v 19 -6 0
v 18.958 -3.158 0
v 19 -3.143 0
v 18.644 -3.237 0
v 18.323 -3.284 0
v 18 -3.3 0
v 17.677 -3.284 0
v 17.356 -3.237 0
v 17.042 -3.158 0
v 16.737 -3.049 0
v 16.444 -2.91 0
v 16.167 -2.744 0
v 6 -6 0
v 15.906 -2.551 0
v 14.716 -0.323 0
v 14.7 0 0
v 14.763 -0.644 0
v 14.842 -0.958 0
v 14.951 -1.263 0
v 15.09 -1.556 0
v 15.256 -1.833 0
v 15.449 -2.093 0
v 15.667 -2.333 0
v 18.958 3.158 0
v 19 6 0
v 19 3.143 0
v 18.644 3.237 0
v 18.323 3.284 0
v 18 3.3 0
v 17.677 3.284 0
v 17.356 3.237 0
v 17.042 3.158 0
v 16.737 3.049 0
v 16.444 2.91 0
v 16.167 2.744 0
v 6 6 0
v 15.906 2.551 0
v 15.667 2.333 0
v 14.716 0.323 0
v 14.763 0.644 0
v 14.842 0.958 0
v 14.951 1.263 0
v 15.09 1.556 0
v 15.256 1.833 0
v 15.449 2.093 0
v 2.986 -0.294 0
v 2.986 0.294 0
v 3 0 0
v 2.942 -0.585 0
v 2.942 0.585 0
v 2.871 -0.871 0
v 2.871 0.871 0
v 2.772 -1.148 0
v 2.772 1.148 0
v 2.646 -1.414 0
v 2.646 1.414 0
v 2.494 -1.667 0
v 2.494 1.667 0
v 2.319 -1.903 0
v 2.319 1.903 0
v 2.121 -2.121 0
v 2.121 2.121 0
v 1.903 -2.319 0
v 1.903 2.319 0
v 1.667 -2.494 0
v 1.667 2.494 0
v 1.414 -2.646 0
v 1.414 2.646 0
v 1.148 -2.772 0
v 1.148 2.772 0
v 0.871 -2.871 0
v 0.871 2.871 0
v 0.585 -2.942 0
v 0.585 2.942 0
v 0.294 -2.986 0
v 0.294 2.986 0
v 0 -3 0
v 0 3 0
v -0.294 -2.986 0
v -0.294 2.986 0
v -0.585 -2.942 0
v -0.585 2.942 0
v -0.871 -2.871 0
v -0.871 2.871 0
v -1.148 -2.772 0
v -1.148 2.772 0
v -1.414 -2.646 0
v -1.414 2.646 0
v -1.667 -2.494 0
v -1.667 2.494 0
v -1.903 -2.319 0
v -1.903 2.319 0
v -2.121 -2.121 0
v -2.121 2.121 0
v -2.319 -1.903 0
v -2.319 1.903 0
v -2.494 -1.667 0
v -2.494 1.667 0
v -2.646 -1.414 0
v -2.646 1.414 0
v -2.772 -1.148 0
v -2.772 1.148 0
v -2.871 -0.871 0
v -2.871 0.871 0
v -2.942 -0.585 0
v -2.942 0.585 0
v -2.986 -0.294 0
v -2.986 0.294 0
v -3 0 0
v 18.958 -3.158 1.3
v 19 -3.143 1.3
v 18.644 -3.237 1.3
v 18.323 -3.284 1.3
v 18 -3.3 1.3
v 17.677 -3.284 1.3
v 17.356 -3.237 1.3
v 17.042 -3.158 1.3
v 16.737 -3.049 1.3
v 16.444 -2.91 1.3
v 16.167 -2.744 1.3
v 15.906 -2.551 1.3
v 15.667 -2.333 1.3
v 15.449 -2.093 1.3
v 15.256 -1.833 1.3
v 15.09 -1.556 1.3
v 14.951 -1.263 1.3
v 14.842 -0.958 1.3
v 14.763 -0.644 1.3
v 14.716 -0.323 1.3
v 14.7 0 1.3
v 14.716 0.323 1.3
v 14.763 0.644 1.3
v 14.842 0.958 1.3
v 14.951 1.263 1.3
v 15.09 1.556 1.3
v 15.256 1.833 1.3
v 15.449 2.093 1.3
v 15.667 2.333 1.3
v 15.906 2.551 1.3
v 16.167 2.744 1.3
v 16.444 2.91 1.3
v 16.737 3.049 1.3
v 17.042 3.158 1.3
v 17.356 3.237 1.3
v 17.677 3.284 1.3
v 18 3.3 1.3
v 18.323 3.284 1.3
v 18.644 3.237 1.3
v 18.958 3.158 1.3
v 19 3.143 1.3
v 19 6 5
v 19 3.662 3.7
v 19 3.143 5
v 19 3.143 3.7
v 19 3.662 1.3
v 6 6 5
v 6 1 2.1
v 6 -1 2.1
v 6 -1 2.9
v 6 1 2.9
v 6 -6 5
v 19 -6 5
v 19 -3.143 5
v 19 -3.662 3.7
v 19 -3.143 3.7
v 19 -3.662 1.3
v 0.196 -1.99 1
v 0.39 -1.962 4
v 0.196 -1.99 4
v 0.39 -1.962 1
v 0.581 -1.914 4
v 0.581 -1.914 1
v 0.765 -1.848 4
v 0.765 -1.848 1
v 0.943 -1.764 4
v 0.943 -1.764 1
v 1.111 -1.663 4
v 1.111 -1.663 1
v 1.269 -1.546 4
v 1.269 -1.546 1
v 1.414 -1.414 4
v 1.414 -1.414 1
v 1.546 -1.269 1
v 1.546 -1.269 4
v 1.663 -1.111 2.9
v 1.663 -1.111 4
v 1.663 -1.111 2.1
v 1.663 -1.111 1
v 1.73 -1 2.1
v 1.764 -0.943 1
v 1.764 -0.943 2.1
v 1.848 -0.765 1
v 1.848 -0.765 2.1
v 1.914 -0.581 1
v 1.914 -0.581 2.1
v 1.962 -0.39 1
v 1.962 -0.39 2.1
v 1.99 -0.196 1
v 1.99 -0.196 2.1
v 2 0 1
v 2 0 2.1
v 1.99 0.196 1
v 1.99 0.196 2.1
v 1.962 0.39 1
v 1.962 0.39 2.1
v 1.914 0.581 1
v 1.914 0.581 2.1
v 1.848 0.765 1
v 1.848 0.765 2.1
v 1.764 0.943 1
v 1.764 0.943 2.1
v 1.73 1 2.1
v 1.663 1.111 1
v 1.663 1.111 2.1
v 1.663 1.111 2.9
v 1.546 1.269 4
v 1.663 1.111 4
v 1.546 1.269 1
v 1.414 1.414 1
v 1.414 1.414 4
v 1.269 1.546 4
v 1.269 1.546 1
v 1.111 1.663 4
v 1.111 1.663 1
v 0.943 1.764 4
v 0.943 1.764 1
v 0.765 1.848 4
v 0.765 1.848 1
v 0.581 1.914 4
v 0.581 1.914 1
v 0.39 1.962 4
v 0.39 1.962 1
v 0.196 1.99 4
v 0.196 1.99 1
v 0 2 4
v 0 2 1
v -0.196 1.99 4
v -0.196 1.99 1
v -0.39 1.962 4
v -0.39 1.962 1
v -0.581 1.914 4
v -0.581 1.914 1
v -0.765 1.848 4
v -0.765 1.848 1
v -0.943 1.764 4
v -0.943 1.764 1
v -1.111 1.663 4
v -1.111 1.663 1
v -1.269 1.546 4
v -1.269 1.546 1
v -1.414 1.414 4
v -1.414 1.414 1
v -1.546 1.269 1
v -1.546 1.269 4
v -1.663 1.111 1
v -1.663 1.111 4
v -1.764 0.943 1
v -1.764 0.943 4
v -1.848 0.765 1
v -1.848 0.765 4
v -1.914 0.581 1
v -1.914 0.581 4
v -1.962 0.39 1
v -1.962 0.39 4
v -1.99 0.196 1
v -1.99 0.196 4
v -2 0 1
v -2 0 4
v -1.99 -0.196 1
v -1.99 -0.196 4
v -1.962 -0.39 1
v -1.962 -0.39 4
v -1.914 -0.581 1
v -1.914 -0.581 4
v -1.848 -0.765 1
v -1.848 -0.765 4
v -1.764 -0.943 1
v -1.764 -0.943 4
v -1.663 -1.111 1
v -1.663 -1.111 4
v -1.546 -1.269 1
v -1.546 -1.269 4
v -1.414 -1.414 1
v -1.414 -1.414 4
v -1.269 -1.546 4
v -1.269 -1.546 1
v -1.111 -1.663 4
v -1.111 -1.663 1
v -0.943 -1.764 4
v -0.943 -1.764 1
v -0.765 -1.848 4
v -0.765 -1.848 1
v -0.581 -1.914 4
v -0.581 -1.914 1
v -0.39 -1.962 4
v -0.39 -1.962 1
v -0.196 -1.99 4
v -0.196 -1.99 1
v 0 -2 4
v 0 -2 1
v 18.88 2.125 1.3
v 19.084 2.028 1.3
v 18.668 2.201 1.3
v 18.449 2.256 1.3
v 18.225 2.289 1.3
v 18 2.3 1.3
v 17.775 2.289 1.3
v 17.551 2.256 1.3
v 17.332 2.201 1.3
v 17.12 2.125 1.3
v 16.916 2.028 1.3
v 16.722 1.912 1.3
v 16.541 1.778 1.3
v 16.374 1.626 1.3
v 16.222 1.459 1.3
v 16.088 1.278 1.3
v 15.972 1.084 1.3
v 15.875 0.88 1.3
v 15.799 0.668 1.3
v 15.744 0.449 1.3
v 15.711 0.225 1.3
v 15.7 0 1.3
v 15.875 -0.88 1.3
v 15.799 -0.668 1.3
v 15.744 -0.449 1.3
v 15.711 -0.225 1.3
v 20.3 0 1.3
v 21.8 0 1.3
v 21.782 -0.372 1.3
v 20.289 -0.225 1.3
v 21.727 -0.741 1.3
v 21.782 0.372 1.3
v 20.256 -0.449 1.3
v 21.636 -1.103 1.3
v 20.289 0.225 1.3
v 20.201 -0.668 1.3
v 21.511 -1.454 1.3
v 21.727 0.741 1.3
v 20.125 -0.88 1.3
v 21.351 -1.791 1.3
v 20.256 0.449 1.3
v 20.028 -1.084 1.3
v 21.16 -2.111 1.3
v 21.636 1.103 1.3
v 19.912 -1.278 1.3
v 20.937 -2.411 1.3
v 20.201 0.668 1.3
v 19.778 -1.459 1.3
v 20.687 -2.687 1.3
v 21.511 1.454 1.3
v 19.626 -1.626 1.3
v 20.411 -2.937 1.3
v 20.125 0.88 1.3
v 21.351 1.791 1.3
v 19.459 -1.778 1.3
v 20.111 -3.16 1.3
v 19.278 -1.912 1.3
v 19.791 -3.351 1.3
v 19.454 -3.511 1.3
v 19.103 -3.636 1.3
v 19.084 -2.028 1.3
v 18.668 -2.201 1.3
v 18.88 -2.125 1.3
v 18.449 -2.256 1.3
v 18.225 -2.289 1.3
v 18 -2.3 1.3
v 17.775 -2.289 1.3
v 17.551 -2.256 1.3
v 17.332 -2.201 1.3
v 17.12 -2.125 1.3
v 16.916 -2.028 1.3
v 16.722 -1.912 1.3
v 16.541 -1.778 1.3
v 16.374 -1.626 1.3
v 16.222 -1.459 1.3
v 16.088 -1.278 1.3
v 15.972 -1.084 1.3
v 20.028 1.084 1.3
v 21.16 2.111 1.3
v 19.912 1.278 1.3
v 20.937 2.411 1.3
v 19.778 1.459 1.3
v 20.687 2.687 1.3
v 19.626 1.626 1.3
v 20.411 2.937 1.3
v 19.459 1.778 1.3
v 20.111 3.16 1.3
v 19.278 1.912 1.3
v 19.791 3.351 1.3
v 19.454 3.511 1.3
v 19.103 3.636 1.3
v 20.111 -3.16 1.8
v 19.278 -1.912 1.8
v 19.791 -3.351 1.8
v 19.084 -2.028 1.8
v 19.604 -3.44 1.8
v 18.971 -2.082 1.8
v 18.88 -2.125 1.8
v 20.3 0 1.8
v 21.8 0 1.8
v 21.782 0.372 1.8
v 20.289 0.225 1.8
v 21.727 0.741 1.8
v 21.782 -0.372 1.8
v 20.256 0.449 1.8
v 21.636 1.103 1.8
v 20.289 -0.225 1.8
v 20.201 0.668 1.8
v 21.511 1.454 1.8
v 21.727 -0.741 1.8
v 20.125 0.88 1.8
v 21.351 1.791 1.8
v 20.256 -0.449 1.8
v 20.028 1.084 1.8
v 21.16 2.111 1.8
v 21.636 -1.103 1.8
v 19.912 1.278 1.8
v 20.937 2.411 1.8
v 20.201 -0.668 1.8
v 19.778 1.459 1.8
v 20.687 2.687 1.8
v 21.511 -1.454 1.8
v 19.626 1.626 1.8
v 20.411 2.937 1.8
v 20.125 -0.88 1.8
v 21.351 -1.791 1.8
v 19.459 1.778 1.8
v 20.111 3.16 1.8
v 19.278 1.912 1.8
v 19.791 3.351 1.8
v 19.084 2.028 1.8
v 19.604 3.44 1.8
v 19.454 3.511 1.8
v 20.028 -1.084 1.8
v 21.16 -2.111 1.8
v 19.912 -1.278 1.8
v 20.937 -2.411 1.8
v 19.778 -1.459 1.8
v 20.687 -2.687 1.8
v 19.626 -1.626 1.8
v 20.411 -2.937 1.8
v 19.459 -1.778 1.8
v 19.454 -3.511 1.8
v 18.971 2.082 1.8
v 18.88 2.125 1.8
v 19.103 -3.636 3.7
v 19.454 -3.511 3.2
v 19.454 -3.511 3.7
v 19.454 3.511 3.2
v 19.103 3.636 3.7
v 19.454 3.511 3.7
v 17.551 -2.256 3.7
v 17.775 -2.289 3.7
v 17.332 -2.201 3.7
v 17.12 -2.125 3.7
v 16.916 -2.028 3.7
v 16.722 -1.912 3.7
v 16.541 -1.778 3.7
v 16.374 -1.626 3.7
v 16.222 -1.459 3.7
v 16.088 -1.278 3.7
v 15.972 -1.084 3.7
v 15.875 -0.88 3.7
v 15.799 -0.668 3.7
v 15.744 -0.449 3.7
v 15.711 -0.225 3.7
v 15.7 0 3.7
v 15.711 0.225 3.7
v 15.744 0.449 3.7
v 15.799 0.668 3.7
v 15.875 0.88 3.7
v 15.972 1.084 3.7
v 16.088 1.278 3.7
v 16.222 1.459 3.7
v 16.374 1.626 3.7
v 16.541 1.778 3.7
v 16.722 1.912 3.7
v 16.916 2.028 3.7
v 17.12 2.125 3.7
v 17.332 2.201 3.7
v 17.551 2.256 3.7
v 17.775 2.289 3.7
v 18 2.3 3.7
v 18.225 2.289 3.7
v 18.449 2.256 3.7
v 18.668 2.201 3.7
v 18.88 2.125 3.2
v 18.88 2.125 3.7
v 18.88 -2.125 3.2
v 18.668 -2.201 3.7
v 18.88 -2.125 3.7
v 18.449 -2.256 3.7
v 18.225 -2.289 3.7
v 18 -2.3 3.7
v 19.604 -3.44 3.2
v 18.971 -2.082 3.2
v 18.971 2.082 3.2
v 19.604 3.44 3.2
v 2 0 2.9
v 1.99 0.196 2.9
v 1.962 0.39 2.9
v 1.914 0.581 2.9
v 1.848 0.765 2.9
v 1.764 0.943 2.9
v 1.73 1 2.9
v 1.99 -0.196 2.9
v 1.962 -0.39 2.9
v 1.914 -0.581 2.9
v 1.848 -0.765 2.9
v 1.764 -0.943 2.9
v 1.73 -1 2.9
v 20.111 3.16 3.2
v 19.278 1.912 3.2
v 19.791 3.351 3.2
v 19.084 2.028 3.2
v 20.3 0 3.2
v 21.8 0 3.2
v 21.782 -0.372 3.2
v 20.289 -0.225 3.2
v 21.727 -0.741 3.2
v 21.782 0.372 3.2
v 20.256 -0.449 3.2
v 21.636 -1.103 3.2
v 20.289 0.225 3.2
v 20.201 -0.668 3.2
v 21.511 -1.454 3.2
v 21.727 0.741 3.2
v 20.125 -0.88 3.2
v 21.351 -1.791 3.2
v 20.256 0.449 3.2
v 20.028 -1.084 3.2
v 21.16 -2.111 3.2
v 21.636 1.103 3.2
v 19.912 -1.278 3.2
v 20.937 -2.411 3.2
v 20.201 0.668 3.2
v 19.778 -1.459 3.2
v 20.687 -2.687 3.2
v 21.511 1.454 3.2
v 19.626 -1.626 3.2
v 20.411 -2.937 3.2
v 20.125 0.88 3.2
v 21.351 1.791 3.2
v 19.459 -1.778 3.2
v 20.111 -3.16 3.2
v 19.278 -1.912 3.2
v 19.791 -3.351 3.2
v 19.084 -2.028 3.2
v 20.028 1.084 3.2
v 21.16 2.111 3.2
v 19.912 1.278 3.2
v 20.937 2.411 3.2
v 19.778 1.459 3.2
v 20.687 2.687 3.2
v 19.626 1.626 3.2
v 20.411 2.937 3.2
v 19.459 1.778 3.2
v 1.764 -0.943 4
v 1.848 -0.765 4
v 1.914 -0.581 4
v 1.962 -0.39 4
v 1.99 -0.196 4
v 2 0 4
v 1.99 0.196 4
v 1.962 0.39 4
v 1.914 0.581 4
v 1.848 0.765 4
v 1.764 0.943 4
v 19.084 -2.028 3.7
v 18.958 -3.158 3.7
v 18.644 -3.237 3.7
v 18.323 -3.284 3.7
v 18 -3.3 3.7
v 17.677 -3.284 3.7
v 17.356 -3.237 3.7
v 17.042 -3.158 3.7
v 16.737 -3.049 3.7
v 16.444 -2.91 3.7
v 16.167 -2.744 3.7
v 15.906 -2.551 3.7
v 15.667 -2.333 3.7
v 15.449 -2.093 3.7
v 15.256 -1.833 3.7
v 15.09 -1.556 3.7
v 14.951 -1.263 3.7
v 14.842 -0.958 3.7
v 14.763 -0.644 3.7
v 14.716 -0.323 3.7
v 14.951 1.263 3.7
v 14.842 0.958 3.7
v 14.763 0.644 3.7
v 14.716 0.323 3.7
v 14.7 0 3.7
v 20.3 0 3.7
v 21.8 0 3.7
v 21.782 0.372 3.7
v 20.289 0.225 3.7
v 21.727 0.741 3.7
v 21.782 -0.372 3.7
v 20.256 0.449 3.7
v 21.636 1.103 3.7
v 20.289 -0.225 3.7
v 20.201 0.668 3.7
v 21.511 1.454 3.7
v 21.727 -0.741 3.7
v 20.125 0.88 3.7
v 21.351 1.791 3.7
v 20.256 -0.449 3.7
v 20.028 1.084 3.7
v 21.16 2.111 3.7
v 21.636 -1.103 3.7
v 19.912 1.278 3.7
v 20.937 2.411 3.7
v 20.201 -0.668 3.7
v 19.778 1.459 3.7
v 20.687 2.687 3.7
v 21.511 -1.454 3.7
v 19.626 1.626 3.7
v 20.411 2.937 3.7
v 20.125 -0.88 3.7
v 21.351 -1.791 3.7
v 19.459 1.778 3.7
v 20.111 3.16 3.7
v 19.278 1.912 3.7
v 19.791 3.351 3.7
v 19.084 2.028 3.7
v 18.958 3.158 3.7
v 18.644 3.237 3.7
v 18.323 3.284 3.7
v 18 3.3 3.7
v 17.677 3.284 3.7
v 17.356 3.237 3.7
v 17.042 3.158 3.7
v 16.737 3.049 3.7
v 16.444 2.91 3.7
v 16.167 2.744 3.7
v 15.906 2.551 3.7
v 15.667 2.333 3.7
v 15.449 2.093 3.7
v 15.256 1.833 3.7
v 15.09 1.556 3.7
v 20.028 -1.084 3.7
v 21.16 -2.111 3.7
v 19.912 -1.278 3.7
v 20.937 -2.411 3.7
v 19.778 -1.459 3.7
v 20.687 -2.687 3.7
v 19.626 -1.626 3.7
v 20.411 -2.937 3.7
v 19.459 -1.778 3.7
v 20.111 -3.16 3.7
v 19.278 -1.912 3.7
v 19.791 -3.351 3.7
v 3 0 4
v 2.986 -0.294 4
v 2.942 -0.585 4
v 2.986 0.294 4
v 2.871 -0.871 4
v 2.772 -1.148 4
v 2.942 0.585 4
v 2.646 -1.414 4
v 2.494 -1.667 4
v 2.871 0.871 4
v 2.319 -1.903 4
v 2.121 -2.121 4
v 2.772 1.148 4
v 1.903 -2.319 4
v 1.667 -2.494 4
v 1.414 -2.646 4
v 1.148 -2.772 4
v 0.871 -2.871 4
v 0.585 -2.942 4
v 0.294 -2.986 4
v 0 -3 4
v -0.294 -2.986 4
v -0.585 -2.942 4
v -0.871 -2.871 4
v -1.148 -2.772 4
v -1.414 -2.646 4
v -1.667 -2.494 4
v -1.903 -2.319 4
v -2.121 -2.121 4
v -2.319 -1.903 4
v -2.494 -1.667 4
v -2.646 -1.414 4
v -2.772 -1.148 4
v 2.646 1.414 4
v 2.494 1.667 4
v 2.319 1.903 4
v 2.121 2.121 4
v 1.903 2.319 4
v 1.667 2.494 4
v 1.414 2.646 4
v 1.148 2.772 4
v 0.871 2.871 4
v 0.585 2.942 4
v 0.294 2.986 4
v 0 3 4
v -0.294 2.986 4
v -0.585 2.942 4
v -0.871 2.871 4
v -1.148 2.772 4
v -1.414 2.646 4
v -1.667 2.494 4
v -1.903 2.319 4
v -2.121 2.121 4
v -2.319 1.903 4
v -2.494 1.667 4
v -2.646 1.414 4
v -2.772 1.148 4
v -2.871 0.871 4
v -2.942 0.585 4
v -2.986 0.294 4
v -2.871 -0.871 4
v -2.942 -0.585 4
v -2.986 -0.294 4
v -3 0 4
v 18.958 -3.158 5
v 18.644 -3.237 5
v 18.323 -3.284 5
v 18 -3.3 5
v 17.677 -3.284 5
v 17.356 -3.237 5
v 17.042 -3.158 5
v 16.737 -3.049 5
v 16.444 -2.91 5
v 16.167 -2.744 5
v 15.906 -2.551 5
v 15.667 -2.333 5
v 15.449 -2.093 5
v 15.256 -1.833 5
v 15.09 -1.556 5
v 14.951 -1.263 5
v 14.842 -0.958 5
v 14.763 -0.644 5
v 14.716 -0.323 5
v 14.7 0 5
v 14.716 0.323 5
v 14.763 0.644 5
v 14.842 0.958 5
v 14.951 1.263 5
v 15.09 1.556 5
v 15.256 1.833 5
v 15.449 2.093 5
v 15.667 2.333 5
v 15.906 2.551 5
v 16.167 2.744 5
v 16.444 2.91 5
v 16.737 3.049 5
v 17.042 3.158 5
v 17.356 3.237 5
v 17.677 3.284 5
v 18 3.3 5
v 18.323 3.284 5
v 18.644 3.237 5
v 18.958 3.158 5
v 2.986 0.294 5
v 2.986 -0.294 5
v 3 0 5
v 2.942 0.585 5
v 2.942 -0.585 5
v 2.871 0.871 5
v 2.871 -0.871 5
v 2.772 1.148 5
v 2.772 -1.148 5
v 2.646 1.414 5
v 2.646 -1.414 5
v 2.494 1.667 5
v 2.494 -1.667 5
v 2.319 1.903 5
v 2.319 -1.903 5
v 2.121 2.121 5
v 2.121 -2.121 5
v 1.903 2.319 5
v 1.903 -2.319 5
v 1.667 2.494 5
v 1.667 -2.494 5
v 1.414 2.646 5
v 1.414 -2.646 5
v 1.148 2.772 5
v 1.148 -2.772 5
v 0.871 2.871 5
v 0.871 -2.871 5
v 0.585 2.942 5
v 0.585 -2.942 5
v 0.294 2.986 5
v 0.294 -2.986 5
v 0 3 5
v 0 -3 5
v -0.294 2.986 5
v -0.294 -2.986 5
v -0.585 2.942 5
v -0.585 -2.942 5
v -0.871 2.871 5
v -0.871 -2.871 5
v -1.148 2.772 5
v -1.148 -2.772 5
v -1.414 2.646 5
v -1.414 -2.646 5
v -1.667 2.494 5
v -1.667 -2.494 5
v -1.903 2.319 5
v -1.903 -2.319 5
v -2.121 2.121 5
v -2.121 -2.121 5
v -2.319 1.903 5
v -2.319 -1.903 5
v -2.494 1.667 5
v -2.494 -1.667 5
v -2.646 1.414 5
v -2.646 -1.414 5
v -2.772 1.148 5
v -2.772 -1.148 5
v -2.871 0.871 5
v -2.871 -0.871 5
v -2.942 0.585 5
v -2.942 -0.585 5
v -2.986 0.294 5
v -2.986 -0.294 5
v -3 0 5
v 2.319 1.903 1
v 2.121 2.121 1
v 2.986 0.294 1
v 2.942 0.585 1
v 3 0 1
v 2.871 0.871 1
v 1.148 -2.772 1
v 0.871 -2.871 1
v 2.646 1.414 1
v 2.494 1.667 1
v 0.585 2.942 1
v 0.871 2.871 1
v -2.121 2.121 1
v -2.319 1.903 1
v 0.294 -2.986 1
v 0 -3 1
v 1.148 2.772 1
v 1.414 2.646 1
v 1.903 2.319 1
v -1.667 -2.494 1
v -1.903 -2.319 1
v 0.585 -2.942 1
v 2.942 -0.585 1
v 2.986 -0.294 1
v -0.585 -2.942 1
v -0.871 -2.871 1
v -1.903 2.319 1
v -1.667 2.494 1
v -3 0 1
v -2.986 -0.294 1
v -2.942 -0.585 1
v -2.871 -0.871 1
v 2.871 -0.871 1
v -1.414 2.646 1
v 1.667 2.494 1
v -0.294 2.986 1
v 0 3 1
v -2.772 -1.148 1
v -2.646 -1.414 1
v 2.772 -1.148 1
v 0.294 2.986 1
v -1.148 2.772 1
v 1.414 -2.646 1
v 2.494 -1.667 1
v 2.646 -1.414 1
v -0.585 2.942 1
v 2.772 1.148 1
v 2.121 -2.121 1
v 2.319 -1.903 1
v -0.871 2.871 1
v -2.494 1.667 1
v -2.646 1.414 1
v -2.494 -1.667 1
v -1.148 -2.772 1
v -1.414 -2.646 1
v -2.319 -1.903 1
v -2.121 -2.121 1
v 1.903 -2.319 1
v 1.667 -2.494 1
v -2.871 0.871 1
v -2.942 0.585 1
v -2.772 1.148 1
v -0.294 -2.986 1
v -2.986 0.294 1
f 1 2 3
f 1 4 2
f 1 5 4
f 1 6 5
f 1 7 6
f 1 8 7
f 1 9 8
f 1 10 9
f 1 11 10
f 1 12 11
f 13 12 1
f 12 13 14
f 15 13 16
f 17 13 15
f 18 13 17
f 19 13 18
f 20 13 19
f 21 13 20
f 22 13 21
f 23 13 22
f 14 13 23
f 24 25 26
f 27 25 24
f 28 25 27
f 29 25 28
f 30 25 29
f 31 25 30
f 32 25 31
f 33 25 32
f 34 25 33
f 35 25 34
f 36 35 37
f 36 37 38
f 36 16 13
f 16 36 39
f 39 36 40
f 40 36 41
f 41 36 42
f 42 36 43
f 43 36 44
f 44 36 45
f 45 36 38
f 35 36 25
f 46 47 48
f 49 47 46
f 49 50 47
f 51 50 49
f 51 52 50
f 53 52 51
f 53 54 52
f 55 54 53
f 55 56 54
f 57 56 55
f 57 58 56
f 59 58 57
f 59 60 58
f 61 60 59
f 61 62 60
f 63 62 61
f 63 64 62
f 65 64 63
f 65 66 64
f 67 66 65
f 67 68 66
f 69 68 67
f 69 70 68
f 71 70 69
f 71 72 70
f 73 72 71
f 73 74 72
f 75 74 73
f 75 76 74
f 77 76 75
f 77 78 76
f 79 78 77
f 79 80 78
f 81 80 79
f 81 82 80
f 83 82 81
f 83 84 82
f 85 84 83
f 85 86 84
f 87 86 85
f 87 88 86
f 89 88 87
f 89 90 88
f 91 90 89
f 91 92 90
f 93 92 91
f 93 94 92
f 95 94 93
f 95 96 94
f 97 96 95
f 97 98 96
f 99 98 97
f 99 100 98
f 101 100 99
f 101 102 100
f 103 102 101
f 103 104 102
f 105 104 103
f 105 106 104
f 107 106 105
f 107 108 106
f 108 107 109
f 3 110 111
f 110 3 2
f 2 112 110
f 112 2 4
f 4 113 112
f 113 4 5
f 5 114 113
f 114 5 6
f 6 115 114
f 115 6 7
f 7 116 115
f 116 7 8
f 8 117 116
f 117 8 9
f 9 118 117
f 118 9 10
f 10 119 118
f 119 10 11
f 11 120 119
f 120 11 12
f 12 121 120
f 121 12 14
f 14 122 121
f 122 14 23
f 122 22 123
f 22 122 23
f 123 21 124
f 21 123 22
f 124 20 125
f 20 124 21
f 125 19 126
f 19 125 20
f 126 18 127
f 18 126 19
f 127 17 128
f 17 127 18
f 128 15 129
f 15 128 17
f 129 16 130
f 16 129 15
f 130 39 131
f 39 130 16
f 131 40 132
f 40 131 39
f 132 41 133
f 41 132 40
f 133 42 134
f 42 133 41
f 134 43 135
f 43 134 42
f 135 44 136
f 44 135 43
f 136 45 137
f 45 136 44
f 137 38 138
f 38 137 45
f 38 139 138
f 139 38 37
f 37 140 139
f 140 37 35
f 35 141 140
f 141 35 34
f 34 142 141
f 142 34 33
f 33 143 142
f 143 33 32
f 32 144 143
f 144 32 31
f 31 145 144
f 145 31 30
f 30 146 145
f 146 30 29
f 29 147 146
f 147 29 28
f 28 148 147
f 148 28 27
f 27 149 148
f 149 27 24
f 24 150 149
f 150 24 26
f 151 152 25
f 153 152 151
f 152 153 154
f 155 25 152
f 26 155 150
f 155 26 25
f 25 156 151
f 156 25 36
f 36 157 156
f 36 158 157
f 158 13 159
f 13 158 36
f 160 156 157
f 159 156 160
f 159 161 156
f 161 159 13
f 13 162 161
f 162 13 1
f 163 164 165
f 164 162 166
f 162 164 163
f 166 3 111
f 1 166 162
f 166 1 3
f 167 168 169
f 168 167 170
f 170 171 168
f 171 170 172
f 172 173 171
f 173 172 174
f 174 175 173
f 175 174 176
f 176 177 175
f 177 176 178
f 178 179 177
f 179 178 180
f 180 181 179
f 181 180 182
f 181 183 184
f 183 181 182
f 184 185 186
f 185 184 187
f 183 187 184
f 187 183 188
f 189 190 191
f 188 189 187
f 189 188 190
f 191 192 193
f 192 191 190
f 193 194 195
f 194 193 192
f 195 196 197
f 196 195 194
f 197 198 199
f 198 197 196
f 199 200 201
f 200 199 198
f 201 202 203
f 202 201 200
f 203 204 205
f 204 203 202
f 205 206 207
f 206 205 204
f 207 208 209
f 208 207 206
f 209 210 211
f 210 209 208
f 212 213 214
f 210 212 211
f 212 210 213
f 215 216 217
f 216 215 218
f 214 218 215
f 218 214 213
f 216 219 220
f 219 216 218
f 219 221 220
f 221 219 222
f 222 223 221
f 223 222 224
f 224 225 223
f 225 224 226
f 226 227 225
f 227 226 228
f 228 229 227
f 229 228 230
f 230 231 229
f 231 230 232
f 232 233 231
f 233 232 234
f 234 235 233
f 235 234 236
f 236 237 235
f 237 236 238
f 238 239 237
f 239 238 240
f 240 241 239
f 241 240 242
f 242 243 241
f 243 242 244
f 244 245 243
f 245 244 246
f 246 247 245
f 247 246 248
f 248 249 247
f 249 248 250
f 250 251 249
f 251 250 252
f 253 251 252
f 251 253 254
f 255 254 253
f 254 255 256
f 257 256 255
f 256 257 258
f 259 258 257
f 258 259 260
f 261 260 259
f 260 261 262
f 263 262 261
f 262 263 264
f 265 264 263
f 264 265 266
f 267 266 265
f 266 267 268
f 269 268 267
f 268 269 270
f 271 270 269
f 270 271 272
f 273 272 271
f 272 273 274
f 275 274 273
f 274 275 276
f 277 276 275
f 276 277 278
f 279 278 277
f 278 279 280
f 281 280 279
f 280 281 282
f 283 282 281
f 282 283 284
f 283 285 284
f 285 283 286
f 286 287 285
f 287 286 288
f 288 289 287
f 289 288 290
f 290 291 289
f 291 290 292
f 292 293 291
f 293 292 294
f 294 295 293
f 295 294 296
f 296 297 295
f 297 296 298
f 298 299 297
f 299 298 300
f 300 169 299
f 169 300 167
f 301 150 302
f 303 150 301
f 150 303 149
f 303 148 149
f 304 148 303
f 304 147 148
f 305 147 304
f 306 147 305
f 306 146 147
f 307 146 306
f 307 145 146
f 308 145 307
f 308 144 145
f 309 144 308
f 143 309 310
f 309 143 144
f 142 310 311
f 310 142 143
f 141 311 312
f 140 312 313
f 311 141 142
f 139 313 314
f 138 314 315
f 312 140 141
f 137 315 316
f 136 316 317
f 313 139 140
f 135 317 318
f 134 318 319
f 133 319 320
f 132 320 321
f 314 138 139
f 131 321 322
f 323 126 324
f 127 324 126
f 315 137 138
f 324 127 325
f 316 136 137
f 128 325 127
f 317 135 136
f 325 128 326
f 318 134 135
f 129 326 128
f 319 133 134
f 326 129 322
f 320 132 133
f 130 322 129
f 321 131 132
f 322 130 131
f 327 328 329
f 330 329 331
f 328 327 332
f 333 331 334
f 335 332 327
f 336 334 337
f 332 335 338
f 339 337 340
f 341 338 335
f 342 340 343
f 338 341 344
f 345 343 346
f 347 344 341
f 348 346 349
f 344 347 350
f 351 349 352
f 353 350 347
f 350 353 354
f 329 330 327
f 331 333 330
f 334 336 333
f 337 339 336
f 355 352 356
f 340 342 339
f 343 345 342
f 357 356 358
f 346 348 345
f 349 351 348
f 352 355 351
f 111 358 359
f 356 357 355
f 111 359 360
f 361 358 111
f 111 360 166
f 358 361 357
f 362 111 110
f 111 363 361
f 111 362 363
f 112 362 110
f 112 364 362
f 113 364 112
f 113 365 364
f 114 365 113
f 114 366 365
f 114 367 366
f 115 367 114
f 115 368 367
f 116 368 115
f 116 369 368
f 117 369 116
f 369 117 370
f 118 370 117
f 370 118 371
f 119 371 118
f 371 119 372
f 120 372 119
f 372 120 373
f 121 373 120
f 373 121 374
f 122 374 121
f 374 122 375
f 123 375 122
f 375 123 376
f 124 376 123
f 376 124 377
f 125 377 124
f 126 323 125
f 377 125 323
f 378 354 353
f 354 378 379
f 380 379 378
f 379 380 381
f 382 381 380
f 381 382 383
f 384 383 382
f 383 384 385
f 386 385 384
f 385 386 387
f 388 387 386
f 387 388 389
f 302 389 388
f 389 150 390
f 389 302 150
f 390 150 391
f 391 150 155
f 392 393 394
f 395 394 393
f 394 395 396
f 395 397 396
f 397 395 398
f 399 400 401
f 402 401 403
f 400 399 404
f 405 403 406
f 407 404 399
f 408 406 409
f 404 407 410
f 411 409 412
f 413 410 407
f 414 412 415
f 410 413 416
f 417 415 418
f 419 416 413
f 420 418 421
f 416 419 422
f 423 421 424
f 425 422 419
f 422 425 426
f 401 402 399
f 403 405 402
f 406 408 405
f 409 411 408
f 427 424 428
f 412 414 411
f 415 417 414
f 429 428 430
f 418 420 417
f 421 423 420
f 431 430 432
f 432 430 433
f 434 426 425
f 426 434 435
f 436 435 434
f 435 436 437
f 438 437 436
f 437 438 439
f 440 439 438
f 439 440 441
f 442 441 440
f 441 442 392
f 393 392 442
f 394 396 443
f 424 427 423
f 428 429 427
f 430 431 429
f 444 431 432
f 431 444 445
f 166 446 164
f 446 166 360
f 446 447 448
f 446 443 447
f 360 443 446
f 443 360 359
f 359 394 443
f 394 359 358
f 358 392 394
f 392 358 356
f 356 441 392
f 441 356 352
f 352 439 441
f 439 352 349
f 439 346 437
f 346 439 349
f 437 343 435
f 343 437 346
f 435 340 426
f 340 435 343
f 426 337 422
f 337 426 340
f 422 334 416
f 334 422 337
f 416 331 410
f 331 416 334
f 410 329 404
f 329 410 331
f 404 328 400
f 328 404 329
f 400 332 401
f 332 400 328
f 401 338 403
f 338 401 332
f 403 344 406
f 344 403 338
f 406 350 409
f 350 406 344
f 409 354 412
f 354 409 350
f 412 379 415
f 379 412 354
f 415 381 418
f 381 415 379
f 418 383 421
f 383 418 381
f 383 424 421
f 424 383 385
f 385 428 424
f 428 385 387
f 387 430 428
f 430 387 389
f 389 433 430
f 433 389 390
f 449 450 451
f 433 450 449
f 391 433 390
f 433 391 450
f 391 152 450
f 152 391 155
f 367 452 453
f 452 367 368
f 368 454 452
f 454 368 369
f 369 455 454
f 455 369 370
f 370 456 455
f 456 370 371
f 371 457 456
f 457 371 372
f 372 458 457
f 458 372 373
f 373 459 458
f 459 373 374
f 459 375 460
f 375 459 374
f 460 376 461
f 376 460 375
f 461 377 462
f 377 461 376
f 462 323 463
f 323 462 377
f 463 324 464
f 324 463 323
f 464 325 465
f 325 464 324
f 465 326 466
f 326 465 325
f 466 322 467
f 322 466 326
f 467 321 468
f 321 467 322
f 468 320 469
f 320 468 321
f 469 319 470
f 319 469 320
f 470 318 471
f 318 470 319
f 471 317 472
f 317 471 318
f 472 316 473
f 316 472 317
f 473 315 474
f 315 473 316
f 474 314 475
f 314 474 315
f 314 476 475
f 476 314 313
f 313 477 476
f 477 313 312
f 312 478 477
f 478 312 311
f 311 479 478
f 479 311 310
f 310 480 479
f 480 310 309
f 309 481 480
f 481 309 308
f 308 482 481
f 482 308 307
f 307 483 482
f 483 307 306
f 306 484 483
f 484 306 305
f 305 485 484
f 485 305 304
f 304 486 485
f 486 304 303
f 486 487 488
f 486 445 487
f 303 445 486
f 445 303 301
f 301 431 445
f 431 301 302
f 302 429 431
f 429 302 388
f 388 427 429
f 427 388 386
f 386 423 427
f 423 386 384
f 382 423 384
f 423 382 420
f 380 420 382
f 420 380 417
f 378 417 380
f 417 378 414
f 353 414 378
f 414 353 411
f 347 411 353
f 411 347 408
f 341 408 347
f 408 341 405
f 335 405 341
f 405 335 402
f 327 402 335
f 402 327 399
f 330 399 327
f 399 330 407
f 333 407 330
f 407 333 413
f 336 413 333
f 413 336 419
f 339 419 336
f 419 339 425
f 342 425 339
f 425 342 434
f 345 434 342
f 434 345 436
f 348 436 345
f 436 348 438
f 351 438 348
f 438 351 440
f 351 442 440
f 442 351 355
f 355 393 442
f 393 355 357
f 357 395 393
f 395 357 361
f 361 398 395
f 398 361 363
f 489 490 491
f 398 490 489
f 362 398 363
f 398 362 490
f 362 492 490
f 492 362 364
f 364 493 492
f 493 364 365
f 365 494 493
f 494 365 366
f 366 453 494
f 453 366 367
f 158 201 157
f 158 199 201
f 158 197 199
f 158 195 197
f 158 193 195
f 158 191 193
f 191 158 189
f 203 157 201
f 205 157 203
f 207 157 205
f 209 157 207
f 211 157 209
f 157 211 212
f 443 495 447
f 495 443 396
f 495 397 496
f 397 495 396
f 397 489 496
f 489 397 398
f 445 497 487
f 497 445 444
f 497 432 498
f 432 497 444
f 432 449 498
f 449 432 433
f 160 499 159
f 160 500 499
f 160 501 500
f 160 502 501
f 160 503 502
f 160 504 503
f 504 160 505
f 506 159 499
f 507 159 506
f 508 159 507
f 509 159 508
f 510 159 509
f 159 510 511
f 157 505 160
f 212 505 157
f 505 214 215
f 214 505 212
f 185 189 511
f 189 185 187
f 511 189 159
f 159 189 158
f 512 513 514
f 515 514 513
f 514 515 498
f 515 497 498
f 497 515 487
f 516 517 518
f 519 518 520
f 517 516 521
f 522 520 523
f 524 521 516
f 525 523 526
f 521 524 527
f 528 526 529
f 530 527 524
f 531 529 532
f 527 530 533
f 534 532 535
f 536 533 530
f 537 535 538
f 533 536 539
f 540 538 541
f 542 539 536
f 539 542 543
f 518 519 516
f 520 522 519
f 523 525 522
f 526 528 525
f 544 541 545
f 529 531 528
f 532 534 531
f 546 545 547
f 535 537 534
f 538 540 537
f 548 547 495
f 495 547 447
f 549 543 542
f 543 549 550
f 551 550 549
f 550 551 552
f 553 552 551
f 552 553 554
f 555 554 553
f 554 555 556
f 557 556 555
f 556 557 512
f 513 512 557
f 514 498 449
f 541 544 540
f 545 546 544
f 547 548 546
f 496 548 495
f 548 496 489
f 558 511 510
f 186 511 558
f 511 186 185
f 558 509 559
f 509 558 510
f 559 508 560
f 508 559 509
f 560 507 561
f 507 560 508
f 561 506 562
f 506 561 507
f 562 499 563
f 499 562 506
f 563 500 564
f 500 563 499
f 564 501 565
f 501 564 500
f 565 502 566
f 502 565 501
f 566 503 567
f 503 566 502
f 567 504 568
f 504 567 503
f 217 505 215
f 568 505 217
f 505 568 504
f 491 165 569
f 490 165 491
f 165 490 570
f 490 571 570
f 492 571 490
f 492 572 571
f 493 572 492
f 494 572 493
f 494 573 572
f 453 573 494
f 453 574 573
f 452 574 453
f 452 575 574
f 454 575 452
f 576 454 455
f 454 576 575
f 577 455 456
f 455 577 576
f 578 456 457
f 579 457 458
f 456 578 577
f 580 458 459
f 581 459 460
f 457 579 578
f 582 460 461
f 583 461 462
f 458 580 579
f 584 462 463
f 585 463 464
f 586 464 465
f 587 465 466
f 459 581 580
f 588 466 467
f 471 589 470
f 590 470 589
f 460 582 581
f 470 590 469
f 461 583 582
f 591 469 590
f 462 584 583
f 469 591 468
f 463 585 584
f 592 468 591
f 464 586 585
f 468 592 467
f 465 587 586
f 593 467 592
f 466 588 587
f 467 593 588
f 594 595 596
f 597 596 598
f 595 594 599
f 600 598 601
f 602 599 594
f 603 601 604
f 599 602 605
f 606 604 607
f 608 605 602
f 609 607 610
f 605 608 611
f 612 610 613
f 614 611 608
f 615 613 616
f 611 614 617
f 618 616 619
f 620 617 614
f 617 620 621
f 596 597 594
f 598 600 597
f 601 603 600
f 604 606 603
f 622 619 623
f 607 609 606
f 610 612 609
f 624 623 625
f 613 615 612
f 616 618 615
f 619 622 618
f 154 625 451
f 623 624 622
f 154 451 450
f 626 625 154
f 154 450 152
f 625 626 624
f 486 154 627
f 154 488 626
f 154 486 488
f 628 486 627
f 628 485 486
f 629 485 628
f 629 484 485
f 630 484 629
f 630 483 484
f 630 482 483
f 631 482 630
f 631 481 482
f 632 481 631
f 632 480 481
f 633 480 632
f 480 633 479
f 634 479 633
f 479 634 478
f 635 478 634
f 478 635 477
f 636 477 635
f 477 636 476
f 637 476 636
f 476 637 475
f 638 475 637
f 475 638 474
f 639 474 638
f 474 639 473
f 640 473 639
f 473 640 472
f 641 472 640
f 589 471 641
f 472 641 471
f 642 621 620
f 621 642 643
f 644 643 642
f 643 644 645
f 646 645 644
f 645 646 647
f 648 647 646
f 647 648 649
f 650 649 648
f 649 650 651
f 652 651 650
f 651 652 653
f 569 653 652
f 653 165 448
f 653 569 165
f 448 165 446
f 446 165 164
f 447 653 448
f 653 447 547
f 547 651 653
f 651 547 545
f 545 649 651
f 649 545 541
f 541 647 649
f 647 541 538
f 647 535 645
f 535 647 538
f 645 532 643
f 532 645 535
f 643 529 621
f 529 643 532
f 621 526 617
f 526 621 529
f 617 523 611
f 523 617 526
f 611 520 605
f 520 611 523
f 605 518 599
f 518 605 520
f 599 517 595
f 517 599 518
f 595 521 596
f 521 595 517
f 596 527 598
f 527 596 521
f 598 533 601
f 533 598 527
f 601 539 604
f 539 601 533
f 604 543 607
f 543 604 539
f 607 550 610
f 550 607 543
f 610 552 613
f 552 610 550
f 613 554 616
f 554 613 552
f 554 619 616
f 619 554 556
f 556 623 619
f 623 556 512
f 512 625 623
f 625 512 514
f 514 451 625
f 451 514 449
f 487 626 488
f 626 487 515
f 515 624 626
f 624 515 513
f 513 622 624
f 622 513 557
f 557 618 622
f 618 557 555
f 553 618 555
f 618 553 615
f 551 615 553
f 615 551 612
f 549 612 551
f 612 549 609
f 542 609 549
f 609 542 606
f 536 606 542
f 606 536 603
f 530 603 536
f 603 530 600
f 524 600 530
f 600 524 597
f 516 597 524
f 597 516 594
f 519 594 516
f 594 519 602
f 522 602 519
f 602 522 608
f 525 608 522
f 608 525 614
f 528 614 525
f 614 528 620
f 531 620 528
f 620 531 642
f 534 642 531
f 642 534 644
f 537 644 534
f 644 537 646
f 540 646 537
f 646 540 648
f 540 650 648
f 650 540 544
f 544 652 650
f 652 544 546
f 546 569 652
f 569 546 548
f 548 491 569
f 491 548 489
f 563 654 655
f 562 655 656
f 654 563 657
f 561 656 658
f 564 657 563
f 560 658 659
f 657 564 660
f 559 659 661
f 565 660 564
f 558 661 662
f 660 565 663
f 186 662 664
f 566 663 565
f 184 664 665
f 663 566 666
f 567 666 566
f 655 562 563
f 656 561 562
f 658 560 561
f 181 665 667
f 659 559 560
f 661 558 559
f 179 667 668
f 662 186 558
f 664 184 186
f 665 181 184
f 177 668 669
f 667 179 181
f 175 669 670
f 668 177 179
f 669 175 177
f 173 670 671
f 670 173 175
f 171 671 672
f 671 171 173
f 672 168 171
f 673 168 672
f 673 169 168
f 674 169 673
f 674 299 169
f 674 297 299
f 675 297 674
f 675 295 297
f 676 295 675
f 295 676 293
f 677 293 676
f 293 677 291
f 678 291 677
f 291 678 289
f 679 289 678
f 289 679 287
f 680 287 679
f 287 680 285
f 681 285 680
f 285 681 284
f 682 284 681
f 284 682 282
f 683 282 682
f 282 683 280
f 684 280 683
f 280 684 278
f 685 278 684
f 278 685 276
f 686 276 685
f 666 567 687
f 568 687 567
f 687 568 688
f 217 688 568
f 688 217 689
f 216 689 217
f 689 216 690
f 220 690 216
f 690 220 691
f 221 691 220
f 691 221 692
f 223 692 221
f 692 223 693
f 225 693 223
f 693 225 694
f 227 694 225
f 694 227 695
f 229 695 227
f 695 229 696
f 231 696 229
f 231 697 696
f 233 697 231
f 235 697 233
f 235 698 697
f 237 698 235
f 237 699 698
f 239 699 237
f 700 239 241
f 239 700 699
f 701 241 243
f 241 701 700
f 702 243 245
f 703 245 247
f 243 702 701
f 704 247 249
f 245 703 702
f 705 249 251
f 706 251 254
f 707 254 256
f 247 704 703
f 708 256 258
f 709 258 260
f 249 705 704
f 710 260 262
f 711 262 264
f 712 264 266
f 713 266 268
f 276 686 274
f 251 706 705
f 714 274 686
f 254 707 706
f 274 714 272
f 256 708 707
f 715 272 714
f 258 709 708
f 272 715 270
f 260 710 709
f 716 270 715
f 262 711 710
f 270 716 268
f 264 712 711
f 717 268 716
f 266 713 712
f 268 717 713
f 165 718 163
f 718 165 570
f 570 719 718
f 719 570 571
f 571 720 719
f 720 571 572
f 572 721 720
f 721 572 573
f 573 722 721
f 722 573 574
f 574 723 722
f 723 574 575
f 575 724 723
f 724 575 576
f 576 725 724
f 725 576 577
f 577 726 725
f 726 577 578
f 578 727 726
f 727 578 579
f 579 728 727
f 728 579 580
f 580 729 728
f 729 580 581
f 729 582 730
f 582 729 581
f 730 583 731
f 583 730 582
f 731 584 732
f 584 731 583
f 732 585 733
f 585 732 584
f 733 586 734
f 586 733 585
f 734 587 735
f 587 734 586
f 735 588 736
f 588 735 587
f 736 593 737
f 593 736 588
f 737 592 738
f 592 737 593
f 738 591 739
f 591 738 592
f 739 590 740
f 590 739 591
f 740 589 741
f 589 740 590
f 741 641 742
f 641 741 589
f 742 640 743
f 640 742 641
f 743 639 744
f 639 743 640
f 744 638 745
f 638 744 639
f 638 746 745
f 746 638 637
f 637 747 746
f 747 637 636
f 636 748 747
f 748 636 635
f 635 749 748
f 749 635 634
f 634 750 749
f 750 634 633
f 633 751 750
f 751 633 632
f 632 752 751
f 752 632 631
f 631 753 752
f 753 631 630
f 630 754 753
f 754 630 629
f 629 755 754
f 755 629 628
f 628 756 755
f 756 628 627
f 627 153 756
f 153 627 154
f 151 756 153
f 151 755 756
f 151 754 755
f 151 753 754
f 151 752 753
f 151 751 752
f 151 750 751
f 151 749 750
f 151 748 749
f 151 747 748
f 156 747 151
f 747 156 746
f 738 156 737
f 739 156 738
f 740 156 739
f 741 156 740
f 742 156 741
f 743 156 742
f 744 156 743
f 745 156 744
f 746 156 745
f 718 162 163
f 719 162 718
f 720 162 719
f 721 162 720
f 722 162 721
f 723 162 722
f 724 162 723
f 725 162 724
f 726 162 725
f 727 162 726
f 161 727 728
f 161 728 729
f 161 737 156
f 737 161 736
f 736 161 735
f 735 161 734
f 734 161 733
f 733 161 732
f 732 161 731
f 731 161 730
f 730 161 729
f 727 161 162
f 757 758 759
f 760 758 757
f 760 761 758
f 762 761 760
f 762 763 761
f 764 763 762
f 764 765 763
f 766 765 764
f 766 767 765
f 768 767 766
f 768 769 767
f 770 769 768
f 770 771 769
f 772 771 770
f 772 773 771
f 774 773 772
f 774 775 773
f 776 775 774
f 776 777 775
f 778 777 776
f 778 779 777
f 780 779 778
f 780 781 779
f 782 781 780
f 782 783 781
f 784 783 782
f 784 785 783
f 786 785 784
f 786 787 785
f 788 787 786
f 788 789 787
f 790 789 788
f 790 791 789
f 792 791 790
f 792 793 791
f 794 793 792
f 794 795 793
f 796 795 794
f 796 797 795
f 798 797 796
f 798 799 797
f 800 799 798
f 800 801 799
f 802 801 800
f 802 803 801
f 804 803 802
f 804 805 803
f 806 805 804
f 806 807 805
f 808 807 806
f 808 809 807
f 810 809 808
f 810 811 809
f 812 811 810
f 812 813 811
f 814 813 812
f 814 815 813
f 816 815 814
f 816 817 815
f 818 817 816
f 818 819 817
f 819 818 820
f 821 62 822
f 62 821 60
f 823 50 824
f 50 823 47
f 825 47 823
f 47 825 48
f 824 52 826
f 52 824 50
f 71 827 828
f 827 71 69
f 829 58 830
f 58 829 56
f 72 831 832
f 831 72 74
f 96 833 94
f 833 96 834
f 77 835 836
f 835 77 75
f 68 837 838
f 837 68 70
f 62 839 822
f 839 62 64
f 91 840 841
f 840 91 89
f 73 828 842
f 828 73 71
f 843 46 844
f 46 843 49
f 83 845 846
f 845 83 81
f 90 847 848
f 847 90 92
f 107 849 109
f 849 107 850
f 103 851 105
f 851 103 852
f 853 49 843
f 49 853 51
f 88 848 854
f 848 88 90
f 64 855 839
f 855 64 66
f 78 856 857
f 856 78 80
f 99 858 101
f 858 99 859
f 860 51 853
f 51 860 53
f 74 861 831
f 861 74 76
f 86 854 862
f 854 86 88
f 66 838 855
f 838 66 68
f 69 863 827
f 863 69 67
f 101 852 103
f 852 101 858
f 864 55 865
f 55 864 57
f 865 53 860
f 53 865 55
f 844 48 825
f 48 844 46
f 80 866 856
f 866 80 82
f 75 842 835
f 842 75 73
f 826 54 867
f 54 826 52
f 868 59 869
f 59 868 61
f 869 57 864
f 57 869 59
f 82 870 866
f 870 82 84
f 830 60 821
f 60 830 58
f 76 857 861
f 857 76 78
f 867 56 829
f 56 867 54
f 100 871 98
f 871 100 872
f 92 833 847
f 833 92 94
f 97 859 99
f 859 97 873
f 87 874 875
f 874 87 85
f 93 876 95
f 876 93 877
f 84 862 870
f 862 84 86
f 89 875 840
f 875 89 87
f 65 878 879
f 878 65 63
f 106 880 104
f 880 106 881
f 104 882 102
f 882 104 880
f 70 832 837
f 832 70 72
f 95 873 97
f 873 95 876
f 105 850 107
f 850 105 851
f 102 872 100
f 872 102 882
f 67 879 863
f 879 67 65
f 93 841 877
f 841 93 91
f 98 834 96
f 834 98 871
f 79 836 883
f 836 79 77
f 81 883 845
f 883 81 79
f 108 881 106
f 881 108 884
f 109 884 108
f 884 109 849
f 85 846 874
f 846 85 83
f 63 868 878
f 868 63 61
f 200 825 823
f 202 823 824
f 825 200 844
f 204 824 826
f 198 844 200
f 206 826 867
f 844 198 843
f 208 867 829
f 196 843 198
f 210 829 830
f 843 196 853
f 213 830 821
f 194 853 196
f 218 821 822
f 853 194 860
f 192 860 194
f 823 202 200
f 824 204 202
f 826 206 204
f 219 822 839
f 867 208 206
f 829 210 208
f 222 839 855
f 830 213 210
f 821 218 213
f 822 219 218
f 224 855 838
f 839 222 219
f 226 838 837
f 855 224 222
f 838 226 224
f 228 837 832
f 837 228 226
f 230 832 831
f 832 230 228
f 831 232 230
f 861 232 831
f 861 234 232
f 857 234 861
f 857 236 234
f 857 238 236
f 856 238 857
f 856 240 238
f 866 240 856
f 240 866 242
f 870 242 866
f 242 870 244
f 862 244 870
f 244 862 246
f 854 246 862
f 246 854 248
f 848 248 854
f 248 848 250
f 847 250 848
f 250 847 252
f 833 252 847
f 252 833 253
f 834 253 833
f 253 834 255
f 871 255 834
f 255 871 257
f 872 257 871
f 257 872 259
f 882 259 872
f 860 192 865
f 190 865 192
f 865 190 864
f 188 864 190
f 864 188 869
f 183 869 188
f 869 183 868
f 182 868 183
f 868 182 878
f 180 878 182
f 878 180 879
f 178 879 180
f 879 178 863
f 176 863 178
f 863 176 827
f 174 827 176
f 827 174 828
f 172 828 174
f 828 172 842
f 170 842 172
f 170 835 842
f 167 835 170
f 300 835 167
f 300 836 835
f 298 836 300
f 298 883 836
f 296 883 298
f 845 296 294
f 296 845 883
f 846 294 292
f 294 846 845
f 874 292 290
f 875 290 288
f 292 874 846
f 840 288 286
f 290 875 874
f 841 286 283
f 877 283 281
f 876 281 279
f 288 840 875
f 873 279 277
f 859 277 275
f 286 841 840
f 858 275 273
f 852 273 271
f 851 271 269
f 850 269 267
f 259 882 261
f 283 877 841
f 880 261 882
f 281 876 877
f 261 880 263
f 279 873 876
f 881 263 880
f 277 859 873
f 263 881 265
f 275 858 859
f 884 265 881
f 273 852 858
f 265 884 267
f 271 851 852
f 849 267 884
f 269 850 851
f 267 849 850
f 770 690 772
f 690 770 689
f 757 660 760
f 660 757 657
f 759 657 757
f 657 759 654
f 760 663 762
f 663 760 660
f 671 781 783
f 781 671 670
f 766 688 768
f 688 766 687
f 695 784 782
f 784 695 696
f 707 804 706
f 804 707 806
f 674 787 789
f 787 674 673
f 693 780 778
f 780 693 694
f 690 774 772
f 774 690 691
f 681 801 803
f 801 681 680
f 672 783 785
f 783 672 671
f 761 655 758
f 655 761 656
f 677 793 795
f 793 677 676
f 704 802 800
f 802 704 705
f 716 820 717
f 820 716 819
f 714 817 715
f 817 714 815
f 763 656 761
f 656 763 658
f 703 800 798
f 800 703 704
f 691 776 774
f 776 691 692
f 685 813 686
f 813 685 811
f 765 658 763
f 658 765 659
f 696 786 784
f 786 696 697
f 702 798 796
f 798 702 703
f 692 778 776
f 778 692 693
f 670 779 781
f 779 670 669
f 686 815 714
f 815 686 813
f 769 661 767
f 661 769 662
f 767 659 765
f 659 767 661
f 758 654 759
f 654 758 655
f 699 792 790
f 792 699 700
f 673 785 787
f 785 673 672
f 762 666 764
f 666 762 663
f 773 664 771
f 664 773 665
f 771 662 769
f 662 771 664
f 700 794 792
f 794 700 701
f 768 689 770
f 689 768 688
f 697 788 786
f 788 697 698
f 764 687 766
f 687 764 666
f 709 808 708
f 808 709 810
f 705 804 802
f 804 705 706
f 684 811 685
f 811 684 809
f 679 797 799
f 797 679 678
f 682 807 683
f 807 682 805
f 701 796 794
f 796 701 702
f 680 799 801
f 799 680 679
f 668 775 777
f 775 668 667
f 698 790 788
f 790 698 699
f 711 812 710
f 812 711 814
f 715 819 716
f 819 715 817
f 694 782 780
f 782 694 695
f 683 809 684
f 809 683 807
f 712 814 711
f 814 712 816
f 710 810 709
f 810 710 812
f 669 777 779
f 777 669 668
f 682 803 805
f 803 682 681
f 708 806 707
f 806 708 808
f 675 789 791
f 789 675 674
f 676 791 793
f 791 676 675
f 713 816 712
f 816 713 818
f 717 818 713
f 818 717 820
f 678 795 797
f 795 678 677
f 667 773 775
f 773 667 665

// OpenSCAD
part = "link"; // [link, assembly]
cadverify_only = "";
module instance(name, part, unit = 1) {
    echo(cadverify_instance = [name, part, unit]);
    if (cadverify_only == "" || cadverify_only == name) children();
}

// Parameters (mm)
pitch = 18;          // pin-to-bore distance (10 links = 180mm)
link_w = 12;         // width (Y)
link_t = 5;          // thickness (Z)
pin_d = 4;           // pin shaft diameter
bore_d = 4.6;        // bore diameter (0.3 radial clearance)
cap_d = 6;           // cap diameter
cap_h = 1;           // cap thickness
kn_out_d = 7.6;      // knuckle outer diameter (1.5 wall)
cap_cav_d = 6.6;     // cap clearance diameter (0.3 radial)
neck_w = 2;          // neck width
neck_t = 0.8;        // neck thickness (central only)
slot_half = 65;      // slot half-angle (deg), allows +-30 deg swing
yoke_west = 6;       // yoke west edge (local X)
yoke_east = 19;      // yoke east extent (local X)
$fn = 64;

module link_geom() {
    bore_x = pitch;
    pin_r = pin_d/2;
    bore_r = bore_d/2;
    kn_out_r = kn_out_d/2;
    cav_r = cap_cav_d/2;
    cap_r = cap_d/2;
    wedge_far = 30;
    dy_far = wedge_far * tan(slot_half);
    // Z stack
    z0=0; z1=cap_h;              // 0..1 bottom
    z2=z1+0.3;                   // 1..1.3 lower cap clearance
    z3=z2+0.5;                   // 1.3..1.8 lower lip (closed)
    z4=z3+0.3;                   // 1.8..2.1 lower neck gap (slotted)
    z5=z4+neck_t;                // 2.1..2.9 central (slotted, neck lives)
    z6=z5+0.3;                   // 2.9..3.2 upper neck gap (slotted)
    z7=z6+0.5;                   // 3.2..3.7 upper lip (closed)
    z8=z7+0.3;                   // 3.7..4.0 upper cap clearance
    z9=z8+cap_h;                 // 4..5 top
    // 2D helpers (modules can't take shapes, so inline each layer)
    // bottom (0..1)
    translate([0,0,z0]) linear_extrude(height=z1-z0, convexity=8) {
        difference() {
            union() {
                circle(r=pin_r);
                translate([yoke_west,-link_w/2]) square([yoke_east-yoke_west, link_w]);
            }
            translate([bore_x,0]) circle(r=cav_r);
        }
    }
    // lower cap clearance (1..1.3)
    translate([0,0,z1]) linear_extrude(height=z2-z1, convexity=8) {
        difference() {
            union() {
                circle(r=pin_r);
                translate([yoke_west,-link_w/2]) square([yoke_east-yoke_west, link_w]);
            }
            translate([bore_x,0]) circle(r=cav_r);
        }
    }
    // lower lip (1.3..1.8) closed bore
    translate([0,0,z2]) linear_extrude(height=z3-z2, convexity=8) {
        difference() {
            union() {
                circle(r=pin_r);
                translate([yoke_west,-link_w/2]) square([yoke_east-yoke_west, link_w]);
                translate([bore_x,0]) circle(r=kn_out_r);
            }
            translate([bore_x,0]) circle(r=bore_r);
        }
    }
    // lower neck gap (1.8..2.1) slotted
    translate([0,0,z3]) linear_extrude(height=z4-z3, convexity=8) {
        difference() {
            union() {
                circle(r=pin_r);
                translate([yoke_west,-link_w/2]) square([yoke_east-yoke_west, link_w]);
                translate([bore_x,0]) circle(r=kn_out_r);
            }
            translate([bore_x,0]) circle(r=bore_r);
            polygon(points=[[bore_x,0],[bore_x+wedge_far,dy_far],[bore_x+wedge_far,-dy_far]]);
        }
    }
    // central (2.1..2.9) slotted + neck
    translate([0,0,z4]) linear_extrude(height=z5-z4, convexity=8) {
        difference() {
            union() {
                circle(r=pin_r);
                translate([0,-neck_w/2]) square([yoke_west+1, neck_w]);
                translate([yoke_west,-link_w/2]) square([yoke_east-yoke_west, link_w]);
                translate([bore_x,0]) circle(r=kn_out_r);
            }
            translate([bore_x,0]) circle(r=bore_r);
            polygon(points=[[bore_x,0],[bore_x+wedge_far,dy_far],[bore_x+wedge_far,-dy_far]]);
        }
    }
    // upper neck gap (2.9..3.2) slotted
    translate([0,0,z5]) linear_extrude(height=z6-z5, convexity=8) {
        difference() {
            union() {
                circle(r=pin_r);
                translate([yoke_west,-link_w/2]) square([yoke_east-yoke_west, link_w]);
                translate([bore_x,0]) circle(r=kn_out_r);
            }
            translate([bore_x,0]) circle(r=bore_r);
            polygon(points=[[bore_x,0],[bore_x+wedge_far,dy_far],[bore_x+wedge_far,-dy_far]]);
        }
    }
    // upper lip (3.2..3.7) closed
    translate([0,0,z6]) linear_extrude(height=z7-z6, convexity=8) {
        difference() {
            union() {
                circle(r=pin_r);
                translate([yoke_west,-link_w/2]) square([yoke_east-yoke_west, link_w]);
                translate([bore_x,0]) circle(r=kn_out_r);
            }
            translate([bore_x,0]) circle(r=bore_r);
        }
    }
    // upper cap clearance (3.7..4)
    translate([0,0,z7]) linear_extrude(height=z8-z7, convexity=8) {
        difference() {
            union() {
                circle(r=pin_r);
                translate([yoke_west,-link_w/2]) square([yoke_east-yoke_west, link_w]);
            }
            translate([bore_x,0]) circle(r=cav_r);
        }
    }
    // top (4..5)
    translate([0,0,z8]) linear_extrude(height=z9-z8, convexity=8) {
        difference() {
            union() {
                circle(r=pin_r);
                translate([yoke_west,-link_w/2]) square([yoke_east-yoke_west, link_w]);
            }
            translate([bore_x,0]) circle(r=cav_r);
        }
    }
    // caps (pin ends)
    translate([0,0,0]) cylinder(h=cap_h, r=cap_r);
    translate([0,0,link_t-cap_h]) cylinder(h=cap_h, r=cap_r);
}

if (part == "assembly") {
    instance("link1", "link", 1) translate([0,0,0]) link_geom();
    instance("link2", "link", 1) translate([18,0,0]) link_geom();
    instance("link3", "link", 1) translate([36,0,0]) link_geom();
    echo(cadverify_spec = [
        ["bounds", [[-3, -6, 0], [55.7, 6, 5]]],
        ["support_faces", [["bed", "-z", 200]]],
        ["motions", [
            ["bend", ["link3"], "rotate", [36, 0, 0], [0, 0, 1], [-30, 30]]
        ]],
        ["assembly_order", [
            [["link1", "link2", "link3"], [0, 0, 0]]
        ]],
        ["print_in_place", 0.3],
        ["overhangs_allowed", [
            ["pin cap link1", [[-3, -3, 3.8], [3, 3, 4.2]]],
            ["knuckle joint1", [[14, -4, 1.0], [22, 4, 1.6]]],
            ["pin cap link2", [[15, -3, 3.8], [21, 3, 4.2]]],
            ["knuckle joint2", [[32, -4, 1.0], [40, 4, 1.6]]],
            ["pin cap link3", [[33, -3, 3.8], [39, 3, 4.2]]],
            ["knuckle end", [[50, -4, 1.0], [58, 4, 1.6]]]
        ]],
        ["held", ["link1", "link2", "link3"]]
    ]);
} else {
    link_geom();
    echo(cadverify_spec = [
        ["bounds", [[-3, -6, 0], [19.7, 6, 5]]],
        ["bodies", 1],
        ["through_holes", 0],
        ["support_faces", [["bed", "-z", 100]]],
        ["overhangs_allowed", [
            ["pin cap", [[-3, -3, 3.8], [3, 3, 4.2]]],
            ["knuckle ceiling", [[14, -4, 1.0], [22, 4, 1.6]]]
        ]],
        ["copies", 3],
        ["details", [
            ["body", "material", [[6, -6, 0], [14, 6, 5]], 0.85],
            ["neck", "material", [[0, -1, 2.1], [7, 1, 2.9]], 0.8],
            ["knuckle", "material", [[14.2, -3.8, 1.3], [21.8, 3.8, 3.7]], 0.25],
            ["slot", "void", [[19, -1, 2.1], [21, 1, 2.9]], 0.8],
            ["cap_cavity", "void", [[14.7, -3.3, 0], [21.3, 3.3, 1]], 0.5],
            ["wall", "thickness", [18, 7, 2.5], [0, -1, 0], 3.7],
            ["floor", "thickness", [9, 0, -1], [0, 0, 1], 5]
        ]]
    ]);
}
